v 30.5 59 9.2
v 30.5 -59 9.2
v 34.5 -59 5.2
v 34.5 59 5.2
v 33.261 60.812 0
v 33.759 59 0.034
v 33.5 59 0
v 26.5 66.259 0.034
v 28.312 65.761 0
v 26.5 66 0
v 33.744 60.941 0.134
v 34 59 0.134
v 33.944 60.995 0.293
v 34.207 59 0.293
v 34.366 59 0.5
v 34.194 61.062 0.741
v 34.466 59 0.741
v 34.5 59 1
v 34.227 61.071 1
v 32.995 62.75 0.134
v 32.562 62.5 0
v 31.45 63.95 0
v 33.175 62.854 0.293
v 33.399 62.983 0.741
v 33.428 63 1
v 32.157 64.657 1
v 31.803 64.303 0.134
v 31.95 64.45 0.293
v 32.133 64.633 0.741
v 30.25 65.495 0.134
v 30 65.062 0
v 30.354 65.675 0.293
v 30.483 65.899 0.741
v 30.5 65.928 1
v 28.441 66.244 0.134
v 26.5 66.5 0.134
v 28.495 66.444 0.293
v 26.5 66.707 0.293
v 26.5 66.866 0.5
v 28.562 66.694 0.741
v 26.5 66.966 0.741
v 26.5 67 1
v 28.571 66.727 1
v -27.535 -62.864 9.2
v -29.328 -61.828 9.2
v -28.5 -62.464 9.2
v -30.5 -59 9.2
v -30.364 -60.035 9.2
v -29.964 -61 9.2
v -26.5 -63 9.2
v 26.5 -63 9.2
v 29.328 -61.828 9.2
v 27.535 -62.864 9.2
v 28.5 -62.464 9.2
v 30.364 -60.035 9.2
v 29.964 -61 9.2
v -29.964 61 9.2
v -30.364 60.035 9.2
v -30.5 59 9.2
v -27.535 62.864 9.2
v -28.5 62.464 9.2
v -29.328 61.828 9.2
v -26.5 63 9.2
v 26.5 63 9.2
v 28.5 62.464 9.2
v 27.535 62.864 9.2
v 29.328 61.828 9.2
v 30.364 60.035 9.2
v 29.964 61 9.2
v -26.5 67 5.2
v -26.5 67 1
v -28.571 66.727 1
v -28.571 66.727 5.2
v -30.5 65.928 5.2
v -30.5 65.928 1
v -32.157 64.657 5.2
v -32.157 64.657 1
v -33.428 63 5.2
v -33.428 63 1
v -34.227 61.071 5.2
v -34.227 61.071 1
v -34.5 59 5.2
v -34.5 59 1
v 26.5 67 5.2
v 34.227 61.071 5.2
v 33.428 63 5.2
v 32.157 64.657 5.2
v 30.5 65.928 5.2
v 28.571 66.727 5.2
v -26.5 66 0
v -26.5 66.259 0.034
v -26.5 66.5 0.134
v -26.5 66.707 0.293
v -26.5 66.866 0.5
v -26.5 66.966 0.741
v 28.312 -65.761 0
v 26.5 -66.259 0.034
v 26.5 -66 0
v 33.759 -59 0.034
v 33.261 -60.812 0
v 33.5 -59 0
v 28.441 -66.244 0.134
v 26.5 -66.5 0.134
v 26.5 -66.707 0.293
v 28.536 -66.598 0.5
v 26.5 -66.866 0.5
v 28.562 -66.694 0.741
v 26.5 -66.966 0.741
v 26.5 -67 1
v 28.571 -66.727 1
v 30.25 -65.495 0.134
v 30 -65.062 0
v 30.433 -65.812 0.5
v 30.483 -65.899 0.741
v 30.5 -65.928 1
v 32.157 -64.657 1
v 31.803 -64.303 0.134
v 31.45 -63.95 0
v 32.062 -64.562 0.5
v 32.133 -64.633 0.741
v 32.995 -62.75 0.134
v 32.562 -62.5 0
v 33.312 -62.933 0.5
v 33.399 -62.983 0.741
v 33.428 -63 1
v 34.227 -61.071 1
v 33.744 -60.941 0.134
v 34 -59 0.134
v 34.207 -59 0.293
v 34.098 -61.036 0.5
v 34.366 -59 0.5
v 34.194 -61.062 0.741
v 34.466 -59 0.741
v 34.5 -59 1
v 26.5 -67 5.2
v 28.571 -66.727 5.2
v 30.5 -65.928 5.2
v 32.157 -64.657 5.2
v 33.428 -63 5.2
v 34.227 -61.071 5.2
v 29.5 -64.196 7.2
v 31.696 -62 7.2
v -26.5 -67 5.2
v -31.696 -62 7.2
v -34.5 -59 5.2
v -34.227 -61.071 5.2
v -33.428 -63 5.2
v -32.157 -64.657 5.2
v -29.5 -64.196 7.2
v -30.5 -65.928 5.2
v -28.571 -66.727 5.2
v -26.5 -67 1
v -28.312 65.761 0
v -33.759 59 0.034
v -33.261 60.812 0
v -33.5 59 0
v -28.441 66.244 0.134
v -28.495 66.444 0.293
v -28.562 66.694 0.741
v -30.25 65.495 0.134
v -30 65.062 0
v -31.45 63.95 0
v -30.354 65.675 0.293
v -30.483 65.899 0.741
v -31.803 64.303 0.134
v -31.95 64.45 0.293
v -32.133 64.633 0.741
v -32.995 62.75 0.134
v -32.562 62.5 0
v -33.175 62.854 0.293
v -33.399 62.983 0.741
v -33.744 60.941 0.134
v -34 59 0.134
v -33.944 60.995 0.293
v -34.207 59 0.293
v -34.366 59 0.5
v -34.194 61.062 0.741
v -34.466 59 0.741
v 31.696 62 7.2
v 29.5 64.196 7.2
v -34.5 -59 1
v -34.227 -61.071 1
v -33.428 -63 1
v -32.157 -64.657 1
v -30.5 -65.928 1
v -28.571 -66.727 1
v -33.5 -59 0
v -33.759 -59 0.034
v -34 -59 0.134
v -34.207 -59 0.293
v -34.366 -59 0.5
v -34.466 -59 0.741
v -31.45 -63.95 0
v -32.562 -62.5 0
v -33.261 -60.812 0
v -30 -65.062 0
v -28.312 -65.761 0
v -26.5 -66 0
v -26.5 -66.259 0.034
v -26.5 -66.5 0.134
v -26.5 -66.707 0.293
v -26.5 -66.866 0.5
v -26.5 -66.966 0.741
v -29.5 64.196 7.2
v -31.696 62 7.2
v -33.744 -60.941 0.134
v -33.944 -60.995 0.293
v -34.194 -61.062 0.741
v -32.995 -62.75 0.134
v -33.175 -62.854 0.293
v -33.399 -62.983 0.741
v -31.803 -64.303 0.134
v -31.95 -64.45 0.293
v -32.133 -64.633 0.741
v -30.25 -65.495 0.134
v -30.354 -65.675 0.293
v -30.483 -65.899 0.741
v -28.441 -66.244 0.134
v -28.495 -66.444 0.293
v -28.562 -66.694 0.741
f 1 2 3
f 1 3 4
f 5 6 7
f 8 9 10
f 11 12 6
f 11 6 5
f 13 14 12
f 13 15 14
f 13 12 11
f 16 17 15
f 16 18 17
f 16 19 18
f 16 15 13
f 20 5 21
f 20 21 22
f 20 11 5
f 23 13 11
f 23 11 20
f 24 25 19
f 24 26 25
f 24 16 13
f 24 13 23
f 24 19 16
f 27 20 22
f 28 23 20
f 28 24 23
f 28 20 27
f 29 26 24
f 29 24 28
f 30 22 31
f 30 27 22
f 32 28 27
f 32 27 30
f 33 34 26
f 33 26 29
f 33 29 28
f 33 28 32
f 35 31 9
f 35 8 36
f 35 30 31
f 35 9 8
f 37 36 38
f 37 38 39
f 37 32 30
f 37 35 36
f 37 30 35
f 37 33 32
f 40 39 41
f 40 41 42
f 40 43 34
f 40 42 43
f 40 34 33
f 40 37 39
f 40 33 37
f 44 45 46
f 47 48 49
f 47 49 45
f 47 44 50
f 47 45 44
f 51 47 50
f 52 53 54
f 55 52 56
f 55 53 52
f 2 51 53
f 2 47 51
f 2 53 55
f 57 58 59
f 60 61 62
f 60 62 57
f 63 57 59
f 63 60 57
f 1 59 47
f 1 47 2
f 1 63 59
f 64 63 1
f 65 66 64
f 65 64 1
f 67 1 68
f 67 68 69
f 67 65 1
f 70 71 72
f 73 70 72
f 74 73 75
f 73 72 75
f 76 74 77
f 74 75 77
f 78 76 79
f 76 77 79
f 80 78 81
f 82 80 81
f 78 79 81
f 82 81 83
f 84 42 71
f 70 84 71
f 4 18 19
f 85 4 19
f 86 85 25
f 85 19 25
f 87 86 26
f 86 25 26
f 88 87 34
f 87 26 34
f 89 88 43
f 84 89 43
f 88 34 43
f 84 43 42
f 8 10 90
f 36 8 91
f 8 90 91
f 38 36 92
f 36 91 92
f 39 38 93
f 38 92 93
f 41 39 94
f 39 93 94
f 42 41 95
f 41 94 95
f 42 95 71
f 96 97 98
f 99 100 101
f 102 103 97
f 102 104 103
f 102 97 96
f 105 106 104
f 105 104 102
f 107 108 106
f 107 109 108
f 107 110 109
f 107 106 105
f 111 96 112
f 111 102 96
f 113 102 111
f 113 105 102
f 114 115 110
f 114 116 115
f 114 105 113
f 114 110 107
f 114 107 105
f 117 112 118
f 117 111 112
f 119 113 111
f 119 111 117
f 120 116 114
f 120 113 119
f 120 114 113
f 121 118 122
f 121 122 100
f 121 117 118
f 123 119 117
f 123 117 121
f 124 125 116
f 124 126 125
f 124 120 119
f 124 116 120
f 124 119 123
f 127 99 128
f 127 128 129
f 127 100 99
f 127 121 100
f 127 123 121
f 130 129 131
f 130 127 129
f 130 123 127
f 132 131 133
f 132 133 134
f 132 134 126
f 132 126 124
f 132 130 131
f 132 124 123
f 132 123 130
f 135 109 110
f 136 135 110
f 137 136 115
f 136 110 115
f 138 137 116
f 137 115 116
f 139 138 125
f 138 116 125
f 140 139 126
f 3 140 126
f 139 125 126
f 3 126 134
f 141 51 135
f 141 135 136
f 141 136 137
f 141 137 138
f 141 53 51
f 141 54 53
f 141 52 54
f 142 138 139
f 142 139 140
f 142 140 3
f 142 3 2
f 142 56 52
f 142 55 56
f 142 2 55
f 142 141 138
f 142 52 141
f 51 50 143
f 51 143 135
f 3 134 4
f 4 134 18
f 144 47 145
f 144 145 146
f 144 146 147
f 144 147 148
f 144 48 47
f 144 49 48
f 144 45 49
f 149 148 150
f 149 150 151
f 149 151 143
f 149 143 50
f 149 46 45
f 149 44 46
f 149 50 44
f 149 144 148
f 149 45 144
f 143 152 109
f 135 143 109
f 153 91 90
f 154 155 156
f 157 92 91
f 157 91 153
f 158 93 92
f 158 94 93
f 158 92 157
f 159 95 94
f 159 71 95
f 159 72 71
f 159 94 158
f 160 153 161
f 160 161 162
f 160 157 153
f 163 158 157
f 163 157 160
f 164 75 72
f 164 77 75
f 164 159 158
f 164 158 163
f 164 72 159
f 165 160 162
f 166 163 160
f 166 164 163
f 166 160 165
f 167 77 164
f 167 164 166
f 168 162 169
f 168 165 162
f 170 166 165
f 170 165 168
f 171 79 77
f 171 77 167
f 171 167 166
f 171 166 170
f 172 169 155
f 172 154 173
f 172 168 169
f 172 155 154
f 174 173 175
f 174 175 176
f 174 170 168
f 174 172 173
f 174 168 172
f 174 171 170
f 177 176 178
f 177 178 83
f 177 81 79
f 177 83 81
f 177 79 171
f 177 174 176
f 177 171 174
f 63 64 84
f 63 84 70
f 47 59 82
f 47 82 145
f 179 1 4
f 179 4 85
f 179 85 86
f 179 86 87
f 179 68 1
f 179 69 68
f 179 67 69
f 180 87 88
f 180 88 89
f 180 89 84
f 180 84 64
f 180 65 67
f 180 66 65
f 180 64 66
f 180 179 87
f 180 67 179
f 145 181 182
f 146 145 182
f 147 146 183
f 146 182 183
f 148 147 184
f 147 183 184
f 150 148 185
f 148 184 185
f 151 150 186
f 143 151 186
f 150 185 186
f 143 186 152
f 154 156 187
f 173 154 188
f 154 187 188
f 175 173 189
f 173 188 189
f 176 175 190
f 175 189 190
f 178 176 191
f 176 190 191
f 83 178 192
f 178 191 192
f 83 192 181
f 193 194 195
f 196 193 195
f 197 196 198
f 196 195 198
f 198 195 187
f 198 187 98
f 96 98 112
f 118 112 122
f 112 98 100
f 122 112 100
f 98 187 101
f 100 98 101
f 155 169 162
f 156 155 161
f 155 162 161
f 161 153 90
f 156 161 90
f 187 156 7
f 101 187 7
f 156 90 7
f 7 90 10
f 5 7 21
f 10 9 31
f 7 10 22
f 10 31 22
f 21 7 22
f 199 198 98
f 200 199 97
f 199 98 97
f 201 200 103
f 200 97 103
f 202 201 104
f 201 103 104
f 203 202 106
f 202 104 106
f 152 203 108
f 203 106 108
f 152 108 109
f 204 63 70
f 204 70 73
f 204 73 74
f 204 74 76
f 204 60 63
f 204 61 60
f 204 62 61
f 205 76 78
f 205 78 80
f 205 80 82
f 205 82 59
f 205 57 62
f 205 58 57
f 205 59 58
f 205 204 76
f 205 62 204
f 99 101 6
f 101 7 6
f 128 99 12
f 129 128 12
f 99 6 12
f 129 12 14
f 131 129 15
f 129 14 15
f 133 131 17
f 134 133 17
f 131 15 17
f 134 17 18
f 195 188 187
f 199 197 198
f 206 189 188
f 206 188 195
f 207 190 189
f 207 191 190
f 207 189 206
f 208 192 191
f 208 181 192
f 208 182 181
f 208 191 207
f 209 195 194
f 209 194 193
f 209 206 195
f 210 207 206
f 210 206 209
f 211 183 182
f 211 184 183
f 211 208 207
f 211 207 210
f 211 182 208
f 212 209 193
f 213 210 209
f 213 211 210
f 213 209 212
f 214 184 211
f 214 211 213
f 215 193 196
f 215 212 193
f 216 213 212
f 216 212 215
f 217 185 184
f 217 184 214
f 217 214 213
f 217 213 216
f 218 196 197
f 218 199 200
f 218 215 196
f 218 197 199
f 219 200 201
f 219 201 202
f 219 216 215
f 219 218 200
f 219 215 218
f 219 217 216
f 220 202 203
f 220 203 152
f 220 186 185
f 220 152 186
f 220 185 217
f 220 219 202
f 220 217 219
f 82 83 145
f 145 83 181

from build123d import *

# Parameters (mm, degrees)
F1_DEPTH = 9.2
F2_SIZE  = 4
F3_R     = 1


with BuildPart() as f1:
    # F0 (on Top) → F1 (new body)
    with BuildSketch(Plane.XY):
        with BuildLine():
            Line((26.5, 67), (-26.5, 67))
            ThreePointArc((-26.5, 67), (-32.156854, 64.656854), (-34.5, 59))
            Line((-34.5, 59), (-34.5, -59))
            ThreePointArc((-34.5, -59), (-32.156854, -64.656854), (-26.5, -67))
            Line((-26.5, -67), (26.5, -67))
            ThreePointArc((26.5, -67), (32.156854, -64.656854), (34.5, -59))
            Line((34.5, -59), (34.5, 59))
            ThreePointArc((34.5, 59), (32.156854, 64.656854), (26.5, 67))
        make_face()
    extrude(amount=F1_DEPTH)

    # F2
    f2_edges = [f1.edges().sort_by_distance(p)[0] for p in [
        (-34.5, 0, 9.2),
    ]]
    chamfer(f2_edges, length=F2_SIZE)

    # F3
    f3_edges = [f1.edges().sort_by_distance(p)[0] for p in [
        (34.5, 0, 0),
    ]]
    fillet(f3_edges, radius=F3_R)


solid = f1.part
